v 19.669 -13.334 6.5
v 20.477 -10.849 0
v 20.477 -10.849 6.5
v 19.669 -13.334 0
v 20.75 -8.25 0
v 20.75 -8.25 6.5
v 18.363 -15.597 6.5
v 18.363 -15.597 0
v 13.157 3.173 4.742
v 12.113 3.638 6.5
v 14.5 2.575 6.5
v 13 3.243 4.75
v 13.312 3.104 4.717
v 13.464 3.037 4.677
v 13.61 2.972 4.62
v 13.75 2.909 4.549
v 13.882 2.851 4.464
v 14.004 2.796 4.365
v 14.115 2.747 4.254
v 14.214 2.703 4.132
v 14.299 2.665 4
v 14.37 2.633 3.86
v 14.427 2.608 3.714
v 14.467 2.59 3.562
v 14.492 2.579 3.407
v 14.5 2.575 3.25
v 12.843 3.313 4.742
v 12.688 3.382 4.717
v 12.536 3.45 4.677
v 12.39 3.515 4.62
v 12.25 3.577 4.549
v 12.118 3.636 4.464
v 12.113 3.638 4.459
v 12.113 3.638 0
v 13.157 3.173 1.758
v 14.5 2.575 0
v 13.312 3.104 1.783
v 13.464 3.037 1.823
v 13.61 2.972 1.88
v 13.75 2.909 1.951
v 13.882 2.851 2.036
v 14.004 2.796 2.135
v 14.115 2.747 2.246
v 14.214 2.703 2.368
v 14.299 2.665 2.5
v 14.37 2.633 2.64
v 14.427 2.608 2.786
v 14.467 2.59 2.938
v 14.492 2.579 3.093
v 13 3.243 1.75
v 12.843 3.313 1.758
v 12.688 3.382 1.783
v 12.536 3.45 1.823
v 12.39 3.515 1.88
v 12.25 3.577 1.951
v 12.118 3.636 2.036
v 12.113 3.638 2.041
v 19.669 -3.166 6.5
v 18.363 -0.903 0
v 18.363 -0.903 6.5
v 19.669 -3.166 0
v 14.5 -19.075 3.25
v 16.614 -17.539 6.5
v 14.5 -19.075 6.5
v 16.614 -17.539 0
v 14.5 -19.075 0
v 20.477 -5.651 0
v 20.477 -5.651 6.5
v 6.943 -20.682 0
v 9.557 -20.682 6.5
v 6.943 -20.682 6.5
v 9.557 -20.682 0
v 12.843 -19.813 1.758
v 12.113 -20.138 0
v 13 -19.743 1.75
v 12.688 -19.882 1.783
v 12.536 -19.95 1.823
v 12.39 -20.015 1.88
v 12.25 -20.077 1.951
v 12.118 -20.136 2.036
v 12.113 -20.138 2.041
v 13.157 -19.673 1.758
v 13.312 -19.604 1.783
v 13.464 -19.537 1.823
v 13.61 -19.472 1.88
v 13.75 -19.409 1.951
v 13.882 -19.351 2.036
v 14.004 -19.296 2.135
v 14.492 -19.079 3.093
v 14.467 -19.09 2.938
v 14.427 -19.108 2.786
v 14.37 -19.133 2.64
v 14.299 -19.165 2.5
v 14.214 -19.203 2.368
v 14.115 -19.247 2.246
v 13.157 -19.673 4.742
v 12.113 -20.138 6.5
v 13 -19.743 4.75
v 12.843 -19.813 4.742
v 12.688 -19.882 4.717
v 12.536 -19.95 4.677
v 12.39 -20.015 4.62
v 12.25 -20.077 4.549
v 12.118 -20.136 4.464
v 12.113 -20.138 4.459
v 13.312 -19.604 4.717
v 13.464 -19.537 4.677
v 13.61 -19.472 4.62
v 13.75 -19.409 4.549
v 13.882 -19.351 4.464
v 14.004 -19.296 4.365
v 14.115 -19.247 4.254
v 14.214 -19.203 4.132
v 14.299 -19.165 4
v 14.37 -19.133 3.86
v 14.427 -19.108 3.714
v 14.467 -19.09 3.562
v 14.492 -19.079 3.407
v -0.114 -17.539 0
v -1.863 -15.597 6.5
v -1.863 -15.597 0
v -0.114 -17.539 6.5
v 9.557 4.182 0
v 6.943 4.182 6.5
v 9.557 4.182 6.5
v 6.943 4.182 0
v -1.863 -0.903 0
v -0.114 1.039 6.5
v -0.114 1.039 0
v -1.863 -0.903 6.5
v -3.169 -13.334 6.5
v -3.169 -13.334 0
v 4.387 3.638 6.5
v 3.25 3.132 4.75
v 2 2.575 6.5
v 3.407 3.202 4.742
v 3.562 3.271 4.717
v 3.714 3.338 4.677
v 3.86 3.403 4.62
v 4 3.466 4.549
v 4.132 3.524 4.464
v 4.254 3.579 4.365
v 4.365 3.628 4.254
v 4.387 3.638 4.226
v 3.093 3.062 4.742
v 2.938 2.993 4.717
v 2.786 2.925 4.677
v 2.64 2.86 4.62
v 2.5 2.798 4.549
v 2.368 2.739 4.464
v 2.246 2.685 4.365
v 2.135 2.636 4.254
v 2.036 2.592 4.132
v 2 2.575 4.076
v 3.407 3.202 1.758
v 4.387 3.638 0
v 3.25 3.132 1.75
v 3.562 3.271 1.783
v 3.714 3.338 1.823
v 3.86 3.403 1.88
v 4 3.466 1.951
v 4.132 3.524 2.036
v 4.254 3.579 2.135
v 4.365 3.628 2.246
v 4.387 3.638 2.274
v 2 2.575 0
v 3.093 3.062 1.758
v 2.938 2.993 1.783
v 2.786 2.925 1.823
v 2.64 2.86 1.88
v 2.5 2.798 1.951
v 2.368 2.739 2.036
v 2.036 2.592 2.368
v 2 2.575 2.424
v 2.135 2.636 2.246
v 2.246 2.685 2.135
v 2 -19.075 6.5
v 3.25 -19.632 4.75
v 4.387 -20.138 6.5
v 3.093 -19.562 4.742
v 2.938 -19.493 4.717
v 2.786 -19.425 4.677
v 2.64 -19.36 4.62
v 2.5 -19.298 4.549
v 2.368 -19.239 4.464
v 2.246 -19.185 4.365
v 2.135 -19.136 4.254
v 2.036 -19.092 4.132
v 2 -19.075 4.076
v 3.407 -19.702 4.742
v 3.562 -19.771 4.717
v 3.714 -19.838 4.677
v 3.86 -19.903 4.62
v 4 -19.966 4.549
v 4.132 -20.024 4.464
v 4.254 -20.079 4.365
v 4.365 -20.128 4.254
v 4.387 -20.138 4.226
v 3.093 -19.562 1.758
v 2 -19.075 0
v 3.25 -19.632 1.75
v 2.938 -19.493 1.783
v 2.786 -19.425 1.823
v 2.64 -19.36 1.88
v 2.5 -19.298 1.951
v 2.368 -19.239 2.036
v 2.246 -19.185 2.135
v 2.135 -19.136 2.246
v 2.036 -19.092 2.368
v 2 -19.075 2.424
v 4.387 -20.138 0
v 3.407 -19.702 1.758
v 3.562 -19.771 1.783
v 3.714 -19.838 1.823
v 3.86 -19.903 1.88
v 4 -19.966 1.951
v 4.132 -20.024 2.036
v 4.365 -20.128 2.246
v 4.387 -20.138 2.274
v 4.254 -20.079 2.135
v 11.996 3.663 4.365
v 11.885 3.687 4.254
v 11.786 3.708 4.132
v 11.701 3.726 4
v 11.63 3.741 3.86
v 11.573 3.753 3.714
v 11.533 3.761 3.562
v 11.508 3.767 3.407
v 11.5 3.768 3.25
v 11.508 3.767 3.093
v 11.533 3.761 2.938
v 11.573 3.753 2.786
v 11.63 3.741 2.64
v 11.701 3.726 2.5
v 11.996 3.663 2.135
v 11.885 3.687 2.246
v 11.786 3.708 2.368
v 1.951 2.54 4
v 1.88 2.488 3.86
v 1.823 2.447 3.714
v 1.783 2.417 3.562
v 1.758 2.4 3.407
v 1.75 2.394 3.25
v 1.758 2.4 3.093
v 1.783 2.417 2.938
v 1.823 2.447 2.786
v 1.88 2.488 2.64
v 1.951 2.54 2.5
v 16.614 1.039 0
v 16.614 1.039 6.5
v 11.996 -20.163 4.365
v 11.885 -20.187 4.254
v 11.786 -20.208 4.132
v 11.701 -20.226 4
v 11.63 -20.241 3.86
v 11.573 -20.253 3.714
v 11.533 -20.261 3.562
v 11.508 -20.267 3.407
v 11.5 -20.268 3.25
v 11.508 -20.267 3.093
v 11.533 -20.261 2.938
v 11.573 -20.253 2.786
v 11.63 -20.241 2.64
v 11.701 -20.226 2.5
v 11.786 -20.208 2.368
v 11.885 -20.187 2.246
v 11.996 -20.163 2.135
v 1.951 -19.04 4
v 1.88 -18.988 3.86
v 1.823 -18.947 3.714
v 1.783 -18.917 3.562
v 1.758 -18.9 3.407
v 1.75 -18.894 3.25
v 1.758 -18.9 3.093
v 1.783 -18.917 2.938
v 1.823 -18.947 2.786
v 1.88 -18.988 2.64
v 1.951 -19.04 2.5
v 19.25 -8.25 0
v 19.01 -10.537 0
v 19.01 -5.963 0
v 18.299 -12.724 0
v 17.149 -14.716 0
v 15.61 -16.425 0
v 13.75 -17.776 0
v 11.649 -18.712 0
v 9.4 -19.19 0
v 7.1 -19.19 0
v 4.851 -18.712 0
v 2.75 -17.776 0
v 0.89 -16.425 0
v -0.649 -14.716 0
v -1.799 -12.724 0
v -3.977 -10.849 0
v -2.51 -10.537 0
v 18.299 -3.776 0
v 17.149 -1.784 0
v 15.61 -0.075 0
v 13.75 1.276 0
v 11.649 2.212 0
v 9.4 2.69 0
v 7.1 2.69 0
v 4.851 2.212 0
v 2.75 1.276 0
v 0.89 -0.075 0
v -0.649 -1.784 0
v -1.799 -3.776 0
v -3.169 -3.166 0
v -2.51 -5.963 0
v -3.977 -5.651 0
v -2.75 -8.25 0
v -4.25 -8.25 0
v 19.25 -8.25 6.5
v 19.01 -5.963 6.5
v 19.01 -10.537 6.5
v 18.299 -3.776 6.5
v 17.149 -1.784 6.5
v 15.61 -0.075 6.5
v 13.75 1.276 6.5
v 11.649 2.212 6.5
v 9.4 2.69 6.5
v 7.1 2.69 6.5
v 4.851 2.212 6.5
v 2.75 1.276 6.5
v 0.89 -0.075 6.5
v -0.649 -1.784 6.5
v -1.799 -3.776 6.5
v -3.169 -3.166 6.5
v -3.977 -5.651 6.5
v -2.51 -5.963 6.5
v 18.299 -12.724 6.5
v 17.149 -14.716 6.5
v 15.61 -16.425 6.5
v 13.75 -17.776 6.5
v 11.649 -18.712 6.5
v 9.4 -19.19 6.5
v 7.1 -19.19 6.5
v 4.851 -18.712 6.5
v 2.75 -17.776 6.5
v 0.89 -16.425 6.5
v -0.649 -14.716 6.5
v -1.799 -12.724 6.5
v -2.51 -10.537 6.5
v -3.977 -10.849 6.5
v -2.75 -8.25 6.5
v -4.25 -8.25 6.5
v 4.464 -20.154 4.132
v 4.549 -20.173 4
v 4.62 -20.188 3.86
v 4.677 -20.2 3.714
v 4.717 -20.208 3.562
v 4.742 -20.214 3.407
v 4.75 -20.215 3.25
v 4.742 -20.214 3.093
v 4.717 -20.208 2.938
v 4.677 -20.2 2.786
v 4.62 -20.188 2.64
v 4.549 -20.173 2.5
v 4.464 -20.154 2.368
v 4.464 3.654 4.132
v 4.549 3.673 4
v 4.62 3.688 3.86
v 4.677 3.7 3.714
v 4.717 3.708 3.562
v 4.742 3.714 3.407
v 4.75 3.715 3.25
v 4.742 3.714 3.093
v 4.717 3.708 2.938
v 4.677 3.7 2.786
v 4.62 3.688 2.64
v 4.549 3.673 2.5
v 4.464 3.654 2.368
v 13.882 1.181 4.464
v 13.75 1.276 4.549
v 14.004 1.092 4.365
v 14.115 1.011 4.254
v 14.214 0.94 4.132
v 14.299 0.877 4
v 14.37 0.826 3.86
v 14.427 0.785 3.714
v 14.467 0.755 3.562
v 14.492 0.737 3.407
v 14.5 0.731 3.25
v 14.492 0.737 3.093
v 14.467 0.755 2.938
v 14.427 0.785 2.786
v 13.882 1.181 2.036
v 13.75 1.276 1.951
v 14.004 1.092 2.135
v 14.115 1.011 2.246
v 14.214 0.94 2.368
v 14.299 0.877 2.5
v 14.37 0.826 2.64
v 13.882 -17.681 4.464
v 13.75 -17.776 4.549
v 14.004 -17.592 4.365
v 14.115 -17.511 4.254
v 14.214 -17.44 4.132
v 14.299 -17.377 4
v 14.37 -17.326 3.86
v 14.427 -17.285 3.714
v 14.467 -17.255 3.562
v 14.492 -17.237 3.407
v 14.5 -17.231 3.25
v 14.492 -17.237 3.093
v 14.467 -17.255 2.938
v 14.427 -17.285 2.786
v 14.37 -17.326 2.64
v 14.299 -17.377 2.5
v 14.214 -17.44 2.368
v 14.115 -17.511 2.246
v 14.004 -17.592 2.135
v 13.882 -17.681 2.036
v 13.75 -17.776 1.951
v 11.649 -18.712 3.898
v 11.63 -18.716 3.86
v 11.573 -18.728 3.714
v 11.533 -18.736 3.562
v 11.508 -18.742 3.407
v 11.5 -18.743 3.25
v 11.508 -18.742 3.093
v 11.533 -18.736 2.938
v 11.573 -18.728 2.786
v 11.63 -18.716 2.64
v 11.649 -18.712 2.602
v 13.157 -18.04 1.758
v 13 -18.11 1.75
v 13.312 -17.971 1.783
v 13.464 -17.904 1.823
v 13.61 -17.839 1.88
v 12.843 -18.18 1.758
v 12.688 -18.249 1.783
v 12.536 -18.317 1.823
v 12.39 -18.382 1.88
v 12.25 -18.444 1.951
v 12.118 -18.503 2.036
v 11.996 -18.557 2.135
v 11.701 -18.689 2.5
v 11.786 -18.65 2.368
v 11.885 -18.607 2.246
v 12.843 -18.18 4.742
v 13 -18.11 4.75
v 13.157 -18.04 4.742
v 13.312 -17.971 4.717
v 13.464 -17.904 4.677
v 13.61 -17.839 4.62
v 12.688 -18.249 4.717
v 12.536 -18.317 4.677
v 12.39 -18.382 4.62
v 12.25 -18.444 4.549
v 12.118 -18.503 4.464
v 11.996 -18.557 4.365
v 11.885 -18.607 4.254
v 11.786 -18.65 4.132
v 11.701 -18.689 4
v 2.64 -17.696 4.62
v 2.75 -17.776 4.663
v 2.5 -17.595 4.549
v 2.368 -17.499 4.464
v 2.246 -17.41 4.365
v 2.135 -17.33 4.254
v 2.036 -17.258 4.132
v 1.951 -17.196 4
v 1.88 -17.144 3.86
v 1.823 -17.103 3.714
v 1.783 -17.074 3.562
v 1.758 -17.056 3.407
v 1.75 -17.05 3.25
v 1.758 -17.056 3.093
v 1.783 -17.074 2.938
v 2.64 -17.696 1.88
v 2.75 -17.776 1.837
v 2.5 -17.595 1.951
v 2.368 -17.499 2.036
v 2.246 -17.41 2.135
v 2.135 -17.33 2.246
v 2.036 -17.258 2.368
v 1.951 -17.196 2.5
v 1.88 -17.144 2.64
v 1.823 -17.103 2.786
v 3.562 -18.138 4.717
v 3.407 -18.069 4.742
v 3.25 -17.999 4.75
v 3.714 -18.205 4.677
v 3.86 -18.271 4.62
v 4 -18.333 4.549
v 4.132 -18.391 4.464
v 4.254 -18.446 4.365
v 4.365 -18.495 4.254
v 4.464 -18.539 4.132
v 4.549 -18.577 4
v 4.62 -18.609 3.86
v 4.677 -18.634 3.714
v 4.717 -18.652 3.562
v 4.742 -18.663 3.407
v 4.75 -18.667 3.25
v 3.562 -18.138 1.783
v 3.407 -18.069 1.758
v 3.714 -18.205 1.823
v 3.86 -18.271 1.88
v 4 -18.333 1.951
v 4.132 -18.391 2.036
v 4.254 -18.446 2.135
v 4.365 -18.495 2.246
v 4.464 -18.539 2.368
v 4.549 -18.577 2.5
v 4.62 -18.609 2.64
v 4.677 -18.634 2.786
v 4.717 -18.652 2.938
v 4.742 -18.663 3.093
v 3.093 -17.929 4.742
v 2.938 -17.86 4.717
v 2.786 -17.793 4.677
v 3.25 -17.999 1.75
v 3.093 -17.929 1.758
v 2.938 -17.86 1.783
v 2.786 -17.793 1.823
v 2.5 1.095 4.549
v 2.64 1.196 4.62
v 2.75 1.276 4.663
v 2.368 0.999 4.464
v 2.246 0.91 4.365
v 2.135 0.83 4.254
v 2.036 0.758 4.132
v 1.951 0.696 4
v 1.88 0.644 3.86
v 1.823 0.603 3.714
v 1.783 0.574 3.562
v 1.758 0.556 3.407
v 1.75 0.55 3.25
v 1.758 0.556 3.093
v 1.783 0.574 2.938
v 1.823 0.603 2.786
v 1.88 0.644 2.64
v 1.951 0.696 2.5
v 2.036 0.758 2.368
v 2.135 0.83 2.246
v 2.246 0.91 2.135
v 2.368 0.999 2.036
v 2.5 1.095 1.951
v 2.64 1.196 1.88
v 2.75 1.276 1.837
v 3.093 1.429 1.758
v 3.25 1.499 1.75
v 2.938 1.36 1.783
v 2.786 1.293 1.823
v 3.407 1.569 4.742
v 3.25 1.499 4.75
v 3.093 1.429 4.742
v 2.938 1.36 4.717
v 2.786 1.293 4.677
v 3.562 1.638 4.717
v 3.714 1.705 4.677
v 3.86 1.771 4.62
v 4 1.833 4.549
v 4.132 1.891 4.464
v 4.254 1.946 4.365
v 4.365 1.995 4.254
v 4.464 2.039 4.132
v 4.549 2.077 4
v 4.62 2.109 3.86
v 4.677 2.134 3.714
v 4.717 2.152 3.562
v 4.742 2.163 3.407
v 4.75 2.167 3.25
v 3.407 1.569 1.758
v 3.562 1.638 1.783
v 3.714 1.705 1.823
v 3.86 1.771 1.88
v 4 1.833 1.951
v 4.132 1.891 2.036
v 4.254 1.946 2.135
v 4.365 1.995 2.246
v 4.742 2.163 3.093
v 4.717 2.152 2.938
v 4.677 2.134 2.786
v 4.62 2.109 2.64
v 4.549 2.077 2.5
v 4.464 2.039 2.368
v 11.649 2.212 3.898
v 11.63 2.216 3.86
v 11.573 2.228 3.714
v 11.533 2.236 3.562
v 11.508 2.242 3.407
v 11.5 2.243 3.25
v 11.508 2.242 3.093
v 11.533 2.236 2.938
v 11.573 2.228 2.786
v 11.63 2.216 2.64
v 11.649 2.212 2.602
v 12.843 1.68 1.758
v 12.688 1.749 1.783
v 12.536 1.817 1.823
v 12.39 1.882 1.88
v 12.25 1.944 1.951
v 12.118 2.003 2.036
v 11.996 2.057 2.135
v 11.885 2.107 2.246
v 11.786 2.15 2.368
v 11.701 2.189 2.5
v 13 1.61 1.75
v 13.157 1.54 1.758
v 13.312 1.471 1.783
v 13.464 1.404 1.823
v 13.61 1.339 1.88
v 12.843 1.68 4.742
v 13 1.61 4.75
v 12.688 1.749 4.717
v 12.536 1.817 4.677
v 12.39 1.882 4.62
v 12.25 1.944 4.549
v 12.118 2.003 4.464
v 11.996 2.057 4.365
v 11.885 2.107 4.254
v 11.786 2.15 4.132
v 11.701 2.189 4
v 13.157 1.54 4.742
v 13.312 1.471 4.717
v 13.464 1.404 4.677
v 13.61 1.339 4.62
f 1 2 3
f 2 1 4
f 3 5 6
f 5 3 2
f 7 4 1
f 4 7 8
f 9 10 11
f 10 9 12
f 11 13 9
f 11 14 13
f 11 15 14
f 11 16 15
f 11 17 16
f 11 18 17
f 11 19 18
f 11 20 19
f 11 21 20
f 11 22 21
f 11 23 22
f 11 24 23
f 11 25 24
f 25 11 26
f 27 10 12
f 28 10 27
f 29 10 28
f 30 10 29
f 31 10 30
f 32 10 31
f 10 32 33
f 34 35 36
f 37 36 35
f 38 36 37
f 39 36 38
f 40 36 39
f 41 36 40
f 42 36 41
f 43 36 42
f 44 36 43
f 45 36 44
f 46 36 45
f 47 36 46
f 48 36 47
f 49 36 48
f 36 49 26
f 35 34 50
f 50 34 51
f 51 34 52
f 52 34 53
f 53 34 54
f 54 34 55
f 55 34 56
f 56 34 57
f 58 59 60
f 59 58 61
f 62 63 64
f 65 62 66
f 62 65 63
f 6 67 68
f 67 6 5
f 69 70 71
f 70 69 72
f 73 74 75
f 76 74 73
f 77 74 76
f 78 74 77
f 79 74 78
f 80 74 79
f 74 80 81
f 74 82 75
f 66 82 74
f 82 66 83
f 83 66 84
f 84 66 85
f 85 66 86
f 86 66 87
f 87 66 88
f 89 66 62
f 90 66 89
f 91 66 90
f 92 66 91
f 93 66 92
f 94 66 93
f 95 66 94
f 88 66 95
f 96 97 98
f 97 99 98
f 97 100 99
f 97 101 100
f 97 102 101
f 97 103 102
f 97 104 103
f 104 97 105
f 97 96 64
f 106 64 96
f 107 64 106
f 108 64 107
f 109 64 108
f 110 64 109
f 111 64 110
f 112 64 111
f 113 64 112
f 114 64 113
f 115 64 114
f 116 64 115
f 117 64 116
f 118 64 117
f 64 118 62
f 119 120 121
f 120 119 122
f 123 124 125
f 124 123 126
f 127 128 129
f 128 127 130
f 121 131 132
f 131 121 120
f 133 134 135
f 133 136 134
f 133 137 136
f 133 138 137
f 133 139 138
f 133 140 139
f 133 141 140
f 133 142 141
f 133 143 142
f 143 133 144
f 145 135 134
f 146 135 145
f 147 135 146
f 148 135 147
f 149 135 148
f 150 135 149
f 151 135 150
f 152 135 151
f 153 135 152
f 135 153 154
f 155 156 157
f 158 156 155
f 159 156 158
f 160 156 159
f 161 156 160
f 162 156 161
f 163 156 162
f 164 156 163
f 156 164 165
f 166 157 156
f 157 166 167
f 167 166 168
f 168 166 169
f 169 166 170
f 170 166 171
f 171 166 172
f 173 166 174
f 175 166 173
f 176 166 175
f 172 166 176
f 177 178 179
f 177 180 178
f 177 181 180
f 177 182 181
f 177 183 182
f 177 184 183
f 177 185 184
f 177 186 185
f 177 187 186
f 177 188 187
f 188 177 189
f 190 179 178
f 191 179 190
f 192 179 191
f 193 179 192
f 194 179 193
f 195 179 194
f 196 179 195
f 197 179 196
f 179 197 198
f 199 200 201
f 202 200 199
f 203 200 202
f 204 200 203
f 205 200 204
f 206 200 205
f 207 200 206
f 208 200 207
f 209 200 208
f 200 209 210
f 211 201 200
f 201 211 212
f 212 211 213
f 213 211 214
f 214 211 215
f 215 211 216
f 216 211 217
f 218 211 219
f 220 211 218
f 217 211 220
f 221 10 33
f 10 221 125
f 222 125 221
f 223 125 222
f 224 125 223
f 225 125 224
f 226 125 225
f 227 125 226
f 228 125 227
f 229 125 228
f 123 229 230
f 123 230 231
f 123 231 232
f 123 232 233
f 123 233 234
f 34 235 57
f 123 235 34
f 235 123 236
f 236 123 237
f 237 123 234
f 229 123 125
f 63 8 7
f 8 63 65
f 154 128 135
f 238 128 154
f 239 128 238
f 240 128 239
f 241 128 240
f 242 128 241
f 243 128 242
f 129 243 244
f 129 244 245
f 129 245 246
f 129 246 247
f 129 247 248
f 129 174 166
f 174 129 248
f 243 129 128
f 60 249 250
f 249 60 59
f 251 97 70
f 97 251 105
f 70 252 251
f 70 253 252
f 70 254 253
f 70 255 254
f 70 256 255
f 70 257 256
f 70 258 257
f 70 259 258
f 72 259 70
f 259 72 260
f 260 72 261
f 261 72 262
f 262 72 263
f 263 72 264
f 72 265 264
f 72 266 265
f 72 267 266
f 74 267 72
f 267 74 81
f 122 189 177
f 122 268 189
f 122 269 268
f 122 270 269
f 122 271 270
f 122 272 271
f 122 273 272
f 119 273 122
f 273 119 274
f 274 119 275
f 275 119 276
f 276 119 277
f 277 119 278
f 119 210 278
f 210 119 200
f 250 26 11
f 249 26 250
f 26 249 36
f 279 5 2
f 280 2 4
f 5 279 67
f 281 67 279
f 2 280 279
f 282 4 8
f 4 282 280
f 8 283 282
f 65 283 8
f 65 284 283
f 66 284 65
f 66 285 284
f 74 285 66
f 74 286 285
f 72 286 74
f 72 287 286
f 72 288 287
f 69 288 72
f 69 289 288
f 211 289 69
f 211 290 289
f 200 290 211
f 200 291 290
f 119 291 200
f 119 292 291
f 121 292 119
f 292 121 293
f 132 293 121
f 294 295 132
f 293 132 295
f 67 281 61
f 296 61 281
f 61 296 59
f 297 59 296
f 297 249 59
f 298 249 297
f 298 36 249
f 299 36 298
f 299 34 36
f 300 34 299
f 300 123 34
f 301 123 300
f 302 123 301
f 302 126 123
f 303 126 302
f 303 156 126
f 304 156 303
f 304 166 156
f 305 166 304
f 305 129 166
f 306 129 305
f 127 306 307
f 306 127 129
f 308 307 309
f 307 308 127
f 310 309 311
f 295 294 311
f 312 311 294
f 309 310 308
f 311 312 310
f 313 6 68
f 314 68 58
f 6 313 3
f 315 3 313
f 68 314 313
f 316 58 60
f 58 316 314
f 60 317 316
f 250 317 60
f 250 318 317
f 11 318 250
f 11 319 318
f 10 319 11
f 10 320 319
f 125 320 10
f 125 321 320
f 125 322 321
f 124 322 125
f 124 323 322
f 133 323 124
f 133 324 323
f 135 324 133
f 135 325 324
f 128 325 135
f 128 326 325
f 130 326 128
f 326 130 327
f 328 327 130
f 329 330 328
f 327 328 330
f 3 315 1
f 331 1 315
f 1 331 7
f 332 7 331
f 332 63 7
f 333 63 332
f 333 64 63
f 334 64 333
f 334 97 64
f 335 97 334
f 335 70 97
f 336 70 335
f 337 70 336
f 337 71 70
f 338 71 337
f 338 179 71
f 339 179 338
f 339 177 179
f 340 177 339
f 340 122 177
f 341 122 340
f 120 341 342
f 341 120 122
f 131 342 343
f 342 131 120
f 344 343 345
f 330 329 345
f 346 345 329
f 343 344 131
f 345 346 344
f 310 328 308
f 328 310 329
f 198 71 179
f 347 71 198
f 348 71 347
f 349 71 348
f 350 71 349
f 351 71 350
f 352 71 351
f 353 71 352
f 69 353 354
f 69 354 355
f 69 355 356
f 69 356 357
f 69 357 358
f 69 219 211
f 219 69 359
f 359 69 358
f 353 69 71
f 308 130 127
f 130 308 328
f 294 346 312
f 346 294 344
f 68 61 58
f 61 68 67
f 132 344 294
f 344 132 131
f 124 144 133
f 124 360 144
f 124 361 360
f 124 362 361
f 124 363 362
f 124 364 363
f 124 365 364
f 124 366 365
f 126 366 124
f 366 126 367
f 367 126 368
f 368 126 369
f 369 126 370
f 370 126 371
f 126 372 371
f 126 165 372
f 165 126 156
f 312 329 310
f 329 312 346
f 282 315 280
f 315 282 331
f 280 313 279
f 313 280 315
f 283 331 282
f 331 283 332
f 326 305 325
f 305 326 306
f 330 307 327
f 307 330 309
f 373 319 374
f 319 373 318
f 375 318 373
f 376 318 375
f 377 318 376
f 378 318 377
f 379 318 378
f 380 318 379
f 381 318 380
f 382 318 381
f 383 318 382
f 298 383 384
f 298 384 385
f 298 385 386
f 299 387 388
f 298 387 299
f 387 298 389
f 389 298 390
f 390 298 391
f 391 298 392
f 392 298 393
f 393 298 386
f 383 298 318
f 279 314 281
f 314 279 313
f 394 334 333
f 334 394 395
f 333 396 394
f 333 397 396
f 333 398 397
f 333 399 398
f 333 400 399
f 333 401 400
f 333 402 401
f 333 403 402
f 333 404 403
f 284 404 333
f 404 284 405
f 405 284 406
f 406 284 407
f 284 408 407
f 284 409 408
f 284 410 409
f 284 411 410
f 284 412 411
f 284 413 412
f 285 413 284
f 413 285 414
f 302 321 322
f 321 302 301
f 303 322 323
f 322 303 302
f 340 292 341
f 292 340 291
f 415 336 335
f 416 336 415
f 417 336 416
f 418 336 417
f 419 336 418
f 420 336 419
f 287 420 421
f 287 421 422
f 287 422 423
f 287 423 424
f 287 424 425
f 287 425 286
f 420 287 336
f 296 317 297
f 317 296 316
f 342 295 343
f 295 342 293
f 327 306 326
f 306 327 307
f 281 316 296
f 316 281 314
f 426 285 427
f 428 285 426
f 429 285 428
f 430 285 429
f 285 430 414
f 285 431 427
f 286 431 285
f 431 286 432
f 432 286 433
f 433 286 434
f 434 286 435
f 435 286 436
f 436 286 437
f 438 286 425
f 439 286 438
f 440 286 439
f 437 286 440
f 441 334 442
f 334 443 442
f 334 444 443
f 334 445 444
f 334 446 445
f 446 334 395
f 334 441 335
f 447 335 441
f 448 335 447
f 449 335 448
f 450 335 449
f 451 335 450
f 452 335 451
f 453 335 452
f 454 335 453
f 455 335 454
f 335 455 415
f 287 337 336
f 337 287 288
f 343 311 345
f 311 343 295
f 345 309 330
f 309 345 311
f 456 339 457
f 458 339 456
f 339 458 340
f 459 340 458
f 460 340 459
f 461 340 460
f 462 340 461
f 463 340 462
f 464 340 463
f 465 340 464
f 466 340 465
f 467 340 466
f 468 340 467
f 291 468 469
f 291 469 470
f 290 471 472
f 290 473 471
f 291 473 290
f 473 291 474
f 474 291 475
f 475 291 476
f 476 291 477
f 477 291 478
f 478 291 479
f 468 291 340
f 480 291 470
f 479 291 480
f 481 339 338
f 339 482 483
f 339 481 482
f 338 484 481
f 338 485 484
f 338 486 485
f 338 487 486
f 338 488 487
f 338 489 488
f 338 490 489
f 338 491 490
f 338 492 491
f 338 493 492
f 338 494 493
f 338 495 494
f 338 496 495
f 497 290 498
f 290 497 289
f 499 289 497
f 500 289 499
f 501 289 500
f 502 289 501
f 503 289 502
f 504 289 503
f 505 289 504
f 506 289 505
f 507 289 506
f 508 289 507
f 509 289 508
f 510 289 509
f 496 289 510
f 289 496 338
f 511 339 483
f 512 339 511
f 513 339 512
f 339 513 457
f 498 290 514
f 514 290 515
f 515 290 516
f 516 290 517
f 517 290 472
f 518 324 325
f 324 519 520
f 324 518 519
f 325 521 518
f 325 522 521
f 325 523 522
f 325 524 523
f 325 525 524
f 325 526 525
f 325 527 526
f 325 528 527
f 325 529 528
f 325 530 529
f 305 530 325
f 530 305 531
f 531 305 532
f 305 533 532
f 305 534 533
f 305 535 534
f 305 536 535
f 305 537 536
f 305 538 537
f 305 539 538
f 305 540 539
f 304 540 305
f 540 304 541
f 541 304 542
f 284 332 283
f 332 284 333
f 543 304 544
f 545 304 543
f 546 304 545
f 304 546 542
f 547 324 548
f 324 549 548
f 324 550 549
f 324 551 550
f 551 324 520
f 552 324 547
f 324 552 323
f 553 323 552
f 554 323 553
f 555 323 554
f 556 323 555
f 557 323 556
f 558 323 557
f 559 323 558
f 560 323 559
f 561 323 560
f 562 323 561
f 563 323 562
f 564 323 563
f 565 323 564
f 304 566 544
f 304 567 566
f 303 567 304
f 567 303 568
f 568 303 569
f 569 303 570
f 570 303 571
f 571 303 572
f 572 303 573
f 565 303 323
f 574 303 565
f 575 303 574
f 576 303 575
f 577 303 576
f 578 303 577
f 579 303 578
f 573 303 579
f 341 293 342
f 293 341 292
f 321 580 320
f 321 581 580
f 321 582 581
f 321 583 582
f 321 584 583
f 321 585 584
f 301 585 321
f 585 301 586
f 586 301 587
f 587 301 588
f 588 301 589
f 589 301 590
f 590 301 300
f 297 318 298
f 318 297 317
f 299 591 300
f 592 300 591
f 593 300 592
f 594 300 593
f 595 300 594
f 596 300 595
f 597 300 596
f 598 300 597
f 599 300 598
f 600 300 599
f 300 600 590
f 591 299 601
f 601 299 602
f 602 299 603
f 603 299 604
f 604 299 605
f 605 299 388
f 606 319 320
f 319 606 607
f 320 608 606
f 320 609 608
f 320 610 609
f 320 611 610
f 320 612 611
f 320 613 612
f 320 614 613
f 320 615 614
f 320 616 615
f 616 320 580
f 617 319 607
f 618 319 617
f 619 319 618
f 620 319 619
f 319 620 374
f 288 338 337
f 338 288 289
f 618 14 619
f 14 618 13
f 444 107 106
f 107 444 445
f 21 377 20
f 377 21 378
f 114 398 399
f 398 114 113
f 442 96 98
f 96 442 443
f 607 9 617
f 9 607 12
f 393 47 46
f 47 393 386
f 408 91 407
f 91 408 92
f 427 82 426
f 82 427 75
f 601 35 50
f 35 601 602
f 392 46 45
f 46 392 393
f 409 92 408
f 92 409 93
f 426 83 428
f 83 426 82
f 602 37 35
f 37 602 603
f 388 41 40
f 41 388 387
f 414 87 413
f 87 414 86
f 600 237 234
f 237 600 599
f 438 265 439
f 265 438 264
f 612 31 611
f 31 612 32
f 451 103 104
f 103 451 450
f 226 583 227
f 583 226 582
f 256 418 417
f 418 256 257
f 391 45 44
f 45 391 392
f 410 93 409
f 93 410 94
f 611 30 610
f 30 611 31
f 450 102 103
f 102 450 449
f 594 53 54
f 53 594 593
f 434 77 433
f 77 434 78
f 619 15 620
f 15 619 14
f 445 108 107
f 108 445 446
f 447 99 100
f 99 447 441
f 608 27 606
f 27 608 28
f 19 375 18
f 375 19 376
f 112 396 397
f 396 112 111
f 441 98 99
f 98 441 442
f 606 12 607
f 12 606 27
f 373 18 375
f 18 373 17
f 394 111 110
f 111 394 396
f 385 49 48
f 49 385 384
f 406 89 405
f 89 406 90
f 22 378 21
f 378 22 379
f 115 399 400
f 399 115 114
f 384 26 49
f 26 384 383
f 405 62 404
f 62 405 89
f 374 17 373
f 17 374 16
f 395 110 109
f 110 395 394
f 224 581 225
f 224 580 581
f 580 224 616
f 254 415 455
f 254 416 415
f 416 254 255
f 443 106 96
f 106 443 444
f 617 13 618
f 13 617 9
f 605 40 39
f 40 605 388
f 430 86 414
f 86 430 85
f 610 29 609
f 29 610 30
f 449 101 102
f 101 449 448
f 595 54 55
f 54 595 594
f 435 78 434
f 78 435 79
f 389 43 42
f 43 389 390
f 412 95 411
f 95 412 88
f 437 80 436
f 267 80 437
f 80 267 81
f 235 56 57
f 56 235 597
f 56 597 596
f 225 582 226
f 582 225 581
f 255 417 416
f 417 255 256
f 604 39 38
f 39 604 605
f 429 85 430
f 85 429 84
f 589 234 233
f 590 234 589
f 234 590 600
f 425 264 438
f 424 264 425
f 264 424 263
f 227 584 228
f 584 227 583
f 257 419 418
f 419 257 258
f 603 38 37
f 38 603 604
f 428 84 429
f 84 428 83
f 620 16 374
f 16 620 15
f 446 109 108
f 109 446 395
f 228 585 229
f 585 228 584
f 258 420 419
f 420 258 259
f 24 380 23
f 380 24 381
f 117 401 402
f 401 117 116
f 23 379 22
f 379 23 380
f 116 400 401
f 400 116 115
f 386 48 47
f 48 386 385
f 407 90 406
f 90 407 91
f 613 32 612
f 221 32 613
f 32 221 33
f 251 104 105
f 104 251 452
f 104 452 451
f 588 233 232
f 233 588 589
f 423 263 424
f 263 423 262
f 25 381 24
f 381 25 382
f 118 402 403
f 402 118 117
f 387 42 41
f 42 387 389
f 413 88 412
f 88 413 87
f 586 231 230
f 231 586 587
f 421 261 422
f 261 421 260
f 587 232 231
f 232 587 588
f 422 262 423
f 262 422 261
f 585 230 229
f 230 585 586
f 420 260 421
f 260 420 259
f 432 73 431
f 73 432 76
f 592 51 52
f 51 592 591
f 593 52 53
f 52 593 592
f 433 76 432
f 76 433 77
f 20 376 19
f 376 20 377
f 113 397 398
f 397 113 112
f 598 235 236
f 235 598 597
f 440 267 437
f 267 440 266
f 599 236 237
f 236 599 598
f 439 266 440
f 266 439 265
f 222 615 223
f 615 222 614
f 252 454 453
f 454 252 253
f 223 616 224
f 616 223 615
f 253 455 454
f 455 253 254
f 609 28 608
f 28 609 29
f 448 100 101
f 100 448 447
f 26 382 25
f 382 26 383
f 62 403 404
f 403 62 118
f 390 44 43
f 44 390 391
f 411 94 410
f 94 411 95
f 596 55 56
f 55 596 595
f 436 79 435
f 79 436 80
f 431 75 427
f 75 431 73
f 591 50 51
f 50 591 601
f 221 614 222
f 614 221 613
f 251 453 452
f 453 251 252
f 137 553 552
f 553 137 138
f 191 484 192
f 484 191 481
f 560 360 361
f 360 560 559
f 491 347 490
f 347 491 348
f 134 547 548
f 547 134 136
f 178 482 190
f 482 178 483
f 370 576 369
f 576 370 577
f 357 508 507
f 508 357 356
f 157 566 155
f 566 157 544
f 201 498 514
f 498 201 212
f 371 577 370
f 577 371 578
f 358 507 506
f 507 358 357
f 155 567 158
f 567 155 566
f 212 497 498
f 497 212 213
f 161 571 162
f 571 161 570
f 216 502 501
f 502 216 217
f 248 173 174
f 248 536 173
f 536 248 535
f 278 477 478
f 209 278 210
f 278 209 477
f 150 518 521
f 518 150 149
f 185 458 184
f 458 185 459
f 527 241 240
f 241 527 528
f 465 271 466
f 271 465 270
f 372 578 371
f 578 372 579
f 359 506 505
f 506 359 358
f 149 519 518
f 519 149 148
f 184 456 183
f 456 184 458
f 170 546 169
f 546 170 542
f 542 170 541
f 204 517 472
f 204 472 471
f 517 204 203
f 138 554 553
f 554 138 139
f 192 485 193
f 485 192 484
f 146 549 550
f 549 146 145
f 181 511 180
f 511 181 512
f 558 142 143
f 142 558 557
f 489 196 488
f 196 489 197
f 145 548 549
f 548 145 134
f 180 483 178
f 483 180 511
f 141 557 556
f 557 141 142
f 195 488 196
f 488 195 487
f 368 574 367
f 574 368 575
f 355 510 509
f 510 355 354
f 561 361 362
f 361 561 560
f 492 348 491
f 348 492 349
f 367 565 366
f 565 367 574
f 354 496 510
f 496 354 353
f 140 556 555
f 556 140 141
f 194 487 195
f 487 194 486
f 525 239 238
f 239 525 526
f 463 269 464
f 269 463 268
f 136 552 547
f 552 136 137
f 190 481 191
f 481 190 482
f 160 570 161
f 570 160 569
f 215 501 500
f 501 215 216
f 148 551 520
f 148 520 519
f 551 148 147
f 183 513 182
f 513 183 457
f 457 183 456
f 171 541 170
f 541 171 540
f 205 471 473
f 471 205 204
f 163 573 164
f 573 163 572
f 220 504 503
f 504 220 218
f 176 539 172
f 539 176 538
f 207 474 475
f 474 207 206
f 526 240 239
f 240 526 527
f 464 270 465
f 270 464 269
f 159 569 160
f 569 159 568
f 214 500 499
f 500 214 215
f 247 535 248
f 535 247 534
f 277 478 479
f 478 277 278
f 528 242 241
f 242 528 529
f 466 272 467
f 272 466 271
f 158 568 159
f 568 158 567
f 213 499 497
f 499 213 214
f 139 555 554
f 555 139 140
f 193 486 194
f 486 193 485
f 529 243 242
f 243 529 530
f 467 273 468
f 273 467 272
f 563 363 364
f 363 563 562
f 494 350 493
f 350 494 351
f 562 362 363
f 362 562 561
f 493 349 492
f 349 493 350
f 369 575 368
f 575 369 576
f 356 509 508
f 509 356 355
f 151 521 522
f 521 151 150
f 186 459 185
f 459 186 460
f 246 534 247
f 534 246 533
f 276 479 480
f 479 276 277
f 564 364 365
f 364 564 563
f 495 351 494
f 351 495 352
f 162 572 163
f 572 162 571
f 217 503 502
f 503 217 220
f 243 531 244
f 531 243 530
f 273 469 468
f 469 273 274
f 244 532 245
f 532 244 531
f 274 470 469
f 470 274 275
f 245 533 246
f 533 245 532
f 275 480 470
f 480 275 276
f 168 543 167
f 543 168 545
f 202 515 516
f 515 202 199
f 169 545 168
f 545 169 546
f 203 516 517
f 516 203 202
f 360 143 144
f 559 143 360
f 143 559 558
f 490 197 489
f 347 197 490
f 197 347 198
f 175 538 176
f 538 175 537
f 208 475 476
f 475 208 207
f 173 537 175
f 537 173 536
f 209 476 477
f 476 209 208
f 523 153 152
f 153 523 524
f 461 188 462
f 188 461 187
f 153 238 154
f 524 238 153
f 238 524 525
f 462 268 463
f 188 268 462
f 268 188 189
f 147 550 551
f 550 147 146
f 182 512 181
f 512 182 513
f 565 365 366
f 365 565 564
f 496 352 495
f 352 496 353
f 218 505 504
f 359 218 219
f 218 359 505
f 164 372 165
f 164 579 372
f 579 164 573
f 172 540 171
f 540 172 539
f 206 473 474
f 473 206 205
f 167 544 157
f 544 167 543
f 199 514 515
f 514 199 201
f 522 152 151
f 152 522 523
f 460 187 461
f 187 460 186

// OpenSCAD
rotate([180,0,0])difference(){
translate([8.25,8.25,-3.25]) cylinder(r=12.5,h=6.5, center=true);
translate([8.25,8.25,-3.25]) cylinder(r=11,h=6.5, center=true);
rotate([90,90,0])translate([3.25,13,0])  cylinder(r=1.5,h=400, $fn=60, center = true);
rotate([90,90,0])translate([3.25,3.25,0])  cylinder(r=1.5,h=400, $fn=60, center = true);
}
